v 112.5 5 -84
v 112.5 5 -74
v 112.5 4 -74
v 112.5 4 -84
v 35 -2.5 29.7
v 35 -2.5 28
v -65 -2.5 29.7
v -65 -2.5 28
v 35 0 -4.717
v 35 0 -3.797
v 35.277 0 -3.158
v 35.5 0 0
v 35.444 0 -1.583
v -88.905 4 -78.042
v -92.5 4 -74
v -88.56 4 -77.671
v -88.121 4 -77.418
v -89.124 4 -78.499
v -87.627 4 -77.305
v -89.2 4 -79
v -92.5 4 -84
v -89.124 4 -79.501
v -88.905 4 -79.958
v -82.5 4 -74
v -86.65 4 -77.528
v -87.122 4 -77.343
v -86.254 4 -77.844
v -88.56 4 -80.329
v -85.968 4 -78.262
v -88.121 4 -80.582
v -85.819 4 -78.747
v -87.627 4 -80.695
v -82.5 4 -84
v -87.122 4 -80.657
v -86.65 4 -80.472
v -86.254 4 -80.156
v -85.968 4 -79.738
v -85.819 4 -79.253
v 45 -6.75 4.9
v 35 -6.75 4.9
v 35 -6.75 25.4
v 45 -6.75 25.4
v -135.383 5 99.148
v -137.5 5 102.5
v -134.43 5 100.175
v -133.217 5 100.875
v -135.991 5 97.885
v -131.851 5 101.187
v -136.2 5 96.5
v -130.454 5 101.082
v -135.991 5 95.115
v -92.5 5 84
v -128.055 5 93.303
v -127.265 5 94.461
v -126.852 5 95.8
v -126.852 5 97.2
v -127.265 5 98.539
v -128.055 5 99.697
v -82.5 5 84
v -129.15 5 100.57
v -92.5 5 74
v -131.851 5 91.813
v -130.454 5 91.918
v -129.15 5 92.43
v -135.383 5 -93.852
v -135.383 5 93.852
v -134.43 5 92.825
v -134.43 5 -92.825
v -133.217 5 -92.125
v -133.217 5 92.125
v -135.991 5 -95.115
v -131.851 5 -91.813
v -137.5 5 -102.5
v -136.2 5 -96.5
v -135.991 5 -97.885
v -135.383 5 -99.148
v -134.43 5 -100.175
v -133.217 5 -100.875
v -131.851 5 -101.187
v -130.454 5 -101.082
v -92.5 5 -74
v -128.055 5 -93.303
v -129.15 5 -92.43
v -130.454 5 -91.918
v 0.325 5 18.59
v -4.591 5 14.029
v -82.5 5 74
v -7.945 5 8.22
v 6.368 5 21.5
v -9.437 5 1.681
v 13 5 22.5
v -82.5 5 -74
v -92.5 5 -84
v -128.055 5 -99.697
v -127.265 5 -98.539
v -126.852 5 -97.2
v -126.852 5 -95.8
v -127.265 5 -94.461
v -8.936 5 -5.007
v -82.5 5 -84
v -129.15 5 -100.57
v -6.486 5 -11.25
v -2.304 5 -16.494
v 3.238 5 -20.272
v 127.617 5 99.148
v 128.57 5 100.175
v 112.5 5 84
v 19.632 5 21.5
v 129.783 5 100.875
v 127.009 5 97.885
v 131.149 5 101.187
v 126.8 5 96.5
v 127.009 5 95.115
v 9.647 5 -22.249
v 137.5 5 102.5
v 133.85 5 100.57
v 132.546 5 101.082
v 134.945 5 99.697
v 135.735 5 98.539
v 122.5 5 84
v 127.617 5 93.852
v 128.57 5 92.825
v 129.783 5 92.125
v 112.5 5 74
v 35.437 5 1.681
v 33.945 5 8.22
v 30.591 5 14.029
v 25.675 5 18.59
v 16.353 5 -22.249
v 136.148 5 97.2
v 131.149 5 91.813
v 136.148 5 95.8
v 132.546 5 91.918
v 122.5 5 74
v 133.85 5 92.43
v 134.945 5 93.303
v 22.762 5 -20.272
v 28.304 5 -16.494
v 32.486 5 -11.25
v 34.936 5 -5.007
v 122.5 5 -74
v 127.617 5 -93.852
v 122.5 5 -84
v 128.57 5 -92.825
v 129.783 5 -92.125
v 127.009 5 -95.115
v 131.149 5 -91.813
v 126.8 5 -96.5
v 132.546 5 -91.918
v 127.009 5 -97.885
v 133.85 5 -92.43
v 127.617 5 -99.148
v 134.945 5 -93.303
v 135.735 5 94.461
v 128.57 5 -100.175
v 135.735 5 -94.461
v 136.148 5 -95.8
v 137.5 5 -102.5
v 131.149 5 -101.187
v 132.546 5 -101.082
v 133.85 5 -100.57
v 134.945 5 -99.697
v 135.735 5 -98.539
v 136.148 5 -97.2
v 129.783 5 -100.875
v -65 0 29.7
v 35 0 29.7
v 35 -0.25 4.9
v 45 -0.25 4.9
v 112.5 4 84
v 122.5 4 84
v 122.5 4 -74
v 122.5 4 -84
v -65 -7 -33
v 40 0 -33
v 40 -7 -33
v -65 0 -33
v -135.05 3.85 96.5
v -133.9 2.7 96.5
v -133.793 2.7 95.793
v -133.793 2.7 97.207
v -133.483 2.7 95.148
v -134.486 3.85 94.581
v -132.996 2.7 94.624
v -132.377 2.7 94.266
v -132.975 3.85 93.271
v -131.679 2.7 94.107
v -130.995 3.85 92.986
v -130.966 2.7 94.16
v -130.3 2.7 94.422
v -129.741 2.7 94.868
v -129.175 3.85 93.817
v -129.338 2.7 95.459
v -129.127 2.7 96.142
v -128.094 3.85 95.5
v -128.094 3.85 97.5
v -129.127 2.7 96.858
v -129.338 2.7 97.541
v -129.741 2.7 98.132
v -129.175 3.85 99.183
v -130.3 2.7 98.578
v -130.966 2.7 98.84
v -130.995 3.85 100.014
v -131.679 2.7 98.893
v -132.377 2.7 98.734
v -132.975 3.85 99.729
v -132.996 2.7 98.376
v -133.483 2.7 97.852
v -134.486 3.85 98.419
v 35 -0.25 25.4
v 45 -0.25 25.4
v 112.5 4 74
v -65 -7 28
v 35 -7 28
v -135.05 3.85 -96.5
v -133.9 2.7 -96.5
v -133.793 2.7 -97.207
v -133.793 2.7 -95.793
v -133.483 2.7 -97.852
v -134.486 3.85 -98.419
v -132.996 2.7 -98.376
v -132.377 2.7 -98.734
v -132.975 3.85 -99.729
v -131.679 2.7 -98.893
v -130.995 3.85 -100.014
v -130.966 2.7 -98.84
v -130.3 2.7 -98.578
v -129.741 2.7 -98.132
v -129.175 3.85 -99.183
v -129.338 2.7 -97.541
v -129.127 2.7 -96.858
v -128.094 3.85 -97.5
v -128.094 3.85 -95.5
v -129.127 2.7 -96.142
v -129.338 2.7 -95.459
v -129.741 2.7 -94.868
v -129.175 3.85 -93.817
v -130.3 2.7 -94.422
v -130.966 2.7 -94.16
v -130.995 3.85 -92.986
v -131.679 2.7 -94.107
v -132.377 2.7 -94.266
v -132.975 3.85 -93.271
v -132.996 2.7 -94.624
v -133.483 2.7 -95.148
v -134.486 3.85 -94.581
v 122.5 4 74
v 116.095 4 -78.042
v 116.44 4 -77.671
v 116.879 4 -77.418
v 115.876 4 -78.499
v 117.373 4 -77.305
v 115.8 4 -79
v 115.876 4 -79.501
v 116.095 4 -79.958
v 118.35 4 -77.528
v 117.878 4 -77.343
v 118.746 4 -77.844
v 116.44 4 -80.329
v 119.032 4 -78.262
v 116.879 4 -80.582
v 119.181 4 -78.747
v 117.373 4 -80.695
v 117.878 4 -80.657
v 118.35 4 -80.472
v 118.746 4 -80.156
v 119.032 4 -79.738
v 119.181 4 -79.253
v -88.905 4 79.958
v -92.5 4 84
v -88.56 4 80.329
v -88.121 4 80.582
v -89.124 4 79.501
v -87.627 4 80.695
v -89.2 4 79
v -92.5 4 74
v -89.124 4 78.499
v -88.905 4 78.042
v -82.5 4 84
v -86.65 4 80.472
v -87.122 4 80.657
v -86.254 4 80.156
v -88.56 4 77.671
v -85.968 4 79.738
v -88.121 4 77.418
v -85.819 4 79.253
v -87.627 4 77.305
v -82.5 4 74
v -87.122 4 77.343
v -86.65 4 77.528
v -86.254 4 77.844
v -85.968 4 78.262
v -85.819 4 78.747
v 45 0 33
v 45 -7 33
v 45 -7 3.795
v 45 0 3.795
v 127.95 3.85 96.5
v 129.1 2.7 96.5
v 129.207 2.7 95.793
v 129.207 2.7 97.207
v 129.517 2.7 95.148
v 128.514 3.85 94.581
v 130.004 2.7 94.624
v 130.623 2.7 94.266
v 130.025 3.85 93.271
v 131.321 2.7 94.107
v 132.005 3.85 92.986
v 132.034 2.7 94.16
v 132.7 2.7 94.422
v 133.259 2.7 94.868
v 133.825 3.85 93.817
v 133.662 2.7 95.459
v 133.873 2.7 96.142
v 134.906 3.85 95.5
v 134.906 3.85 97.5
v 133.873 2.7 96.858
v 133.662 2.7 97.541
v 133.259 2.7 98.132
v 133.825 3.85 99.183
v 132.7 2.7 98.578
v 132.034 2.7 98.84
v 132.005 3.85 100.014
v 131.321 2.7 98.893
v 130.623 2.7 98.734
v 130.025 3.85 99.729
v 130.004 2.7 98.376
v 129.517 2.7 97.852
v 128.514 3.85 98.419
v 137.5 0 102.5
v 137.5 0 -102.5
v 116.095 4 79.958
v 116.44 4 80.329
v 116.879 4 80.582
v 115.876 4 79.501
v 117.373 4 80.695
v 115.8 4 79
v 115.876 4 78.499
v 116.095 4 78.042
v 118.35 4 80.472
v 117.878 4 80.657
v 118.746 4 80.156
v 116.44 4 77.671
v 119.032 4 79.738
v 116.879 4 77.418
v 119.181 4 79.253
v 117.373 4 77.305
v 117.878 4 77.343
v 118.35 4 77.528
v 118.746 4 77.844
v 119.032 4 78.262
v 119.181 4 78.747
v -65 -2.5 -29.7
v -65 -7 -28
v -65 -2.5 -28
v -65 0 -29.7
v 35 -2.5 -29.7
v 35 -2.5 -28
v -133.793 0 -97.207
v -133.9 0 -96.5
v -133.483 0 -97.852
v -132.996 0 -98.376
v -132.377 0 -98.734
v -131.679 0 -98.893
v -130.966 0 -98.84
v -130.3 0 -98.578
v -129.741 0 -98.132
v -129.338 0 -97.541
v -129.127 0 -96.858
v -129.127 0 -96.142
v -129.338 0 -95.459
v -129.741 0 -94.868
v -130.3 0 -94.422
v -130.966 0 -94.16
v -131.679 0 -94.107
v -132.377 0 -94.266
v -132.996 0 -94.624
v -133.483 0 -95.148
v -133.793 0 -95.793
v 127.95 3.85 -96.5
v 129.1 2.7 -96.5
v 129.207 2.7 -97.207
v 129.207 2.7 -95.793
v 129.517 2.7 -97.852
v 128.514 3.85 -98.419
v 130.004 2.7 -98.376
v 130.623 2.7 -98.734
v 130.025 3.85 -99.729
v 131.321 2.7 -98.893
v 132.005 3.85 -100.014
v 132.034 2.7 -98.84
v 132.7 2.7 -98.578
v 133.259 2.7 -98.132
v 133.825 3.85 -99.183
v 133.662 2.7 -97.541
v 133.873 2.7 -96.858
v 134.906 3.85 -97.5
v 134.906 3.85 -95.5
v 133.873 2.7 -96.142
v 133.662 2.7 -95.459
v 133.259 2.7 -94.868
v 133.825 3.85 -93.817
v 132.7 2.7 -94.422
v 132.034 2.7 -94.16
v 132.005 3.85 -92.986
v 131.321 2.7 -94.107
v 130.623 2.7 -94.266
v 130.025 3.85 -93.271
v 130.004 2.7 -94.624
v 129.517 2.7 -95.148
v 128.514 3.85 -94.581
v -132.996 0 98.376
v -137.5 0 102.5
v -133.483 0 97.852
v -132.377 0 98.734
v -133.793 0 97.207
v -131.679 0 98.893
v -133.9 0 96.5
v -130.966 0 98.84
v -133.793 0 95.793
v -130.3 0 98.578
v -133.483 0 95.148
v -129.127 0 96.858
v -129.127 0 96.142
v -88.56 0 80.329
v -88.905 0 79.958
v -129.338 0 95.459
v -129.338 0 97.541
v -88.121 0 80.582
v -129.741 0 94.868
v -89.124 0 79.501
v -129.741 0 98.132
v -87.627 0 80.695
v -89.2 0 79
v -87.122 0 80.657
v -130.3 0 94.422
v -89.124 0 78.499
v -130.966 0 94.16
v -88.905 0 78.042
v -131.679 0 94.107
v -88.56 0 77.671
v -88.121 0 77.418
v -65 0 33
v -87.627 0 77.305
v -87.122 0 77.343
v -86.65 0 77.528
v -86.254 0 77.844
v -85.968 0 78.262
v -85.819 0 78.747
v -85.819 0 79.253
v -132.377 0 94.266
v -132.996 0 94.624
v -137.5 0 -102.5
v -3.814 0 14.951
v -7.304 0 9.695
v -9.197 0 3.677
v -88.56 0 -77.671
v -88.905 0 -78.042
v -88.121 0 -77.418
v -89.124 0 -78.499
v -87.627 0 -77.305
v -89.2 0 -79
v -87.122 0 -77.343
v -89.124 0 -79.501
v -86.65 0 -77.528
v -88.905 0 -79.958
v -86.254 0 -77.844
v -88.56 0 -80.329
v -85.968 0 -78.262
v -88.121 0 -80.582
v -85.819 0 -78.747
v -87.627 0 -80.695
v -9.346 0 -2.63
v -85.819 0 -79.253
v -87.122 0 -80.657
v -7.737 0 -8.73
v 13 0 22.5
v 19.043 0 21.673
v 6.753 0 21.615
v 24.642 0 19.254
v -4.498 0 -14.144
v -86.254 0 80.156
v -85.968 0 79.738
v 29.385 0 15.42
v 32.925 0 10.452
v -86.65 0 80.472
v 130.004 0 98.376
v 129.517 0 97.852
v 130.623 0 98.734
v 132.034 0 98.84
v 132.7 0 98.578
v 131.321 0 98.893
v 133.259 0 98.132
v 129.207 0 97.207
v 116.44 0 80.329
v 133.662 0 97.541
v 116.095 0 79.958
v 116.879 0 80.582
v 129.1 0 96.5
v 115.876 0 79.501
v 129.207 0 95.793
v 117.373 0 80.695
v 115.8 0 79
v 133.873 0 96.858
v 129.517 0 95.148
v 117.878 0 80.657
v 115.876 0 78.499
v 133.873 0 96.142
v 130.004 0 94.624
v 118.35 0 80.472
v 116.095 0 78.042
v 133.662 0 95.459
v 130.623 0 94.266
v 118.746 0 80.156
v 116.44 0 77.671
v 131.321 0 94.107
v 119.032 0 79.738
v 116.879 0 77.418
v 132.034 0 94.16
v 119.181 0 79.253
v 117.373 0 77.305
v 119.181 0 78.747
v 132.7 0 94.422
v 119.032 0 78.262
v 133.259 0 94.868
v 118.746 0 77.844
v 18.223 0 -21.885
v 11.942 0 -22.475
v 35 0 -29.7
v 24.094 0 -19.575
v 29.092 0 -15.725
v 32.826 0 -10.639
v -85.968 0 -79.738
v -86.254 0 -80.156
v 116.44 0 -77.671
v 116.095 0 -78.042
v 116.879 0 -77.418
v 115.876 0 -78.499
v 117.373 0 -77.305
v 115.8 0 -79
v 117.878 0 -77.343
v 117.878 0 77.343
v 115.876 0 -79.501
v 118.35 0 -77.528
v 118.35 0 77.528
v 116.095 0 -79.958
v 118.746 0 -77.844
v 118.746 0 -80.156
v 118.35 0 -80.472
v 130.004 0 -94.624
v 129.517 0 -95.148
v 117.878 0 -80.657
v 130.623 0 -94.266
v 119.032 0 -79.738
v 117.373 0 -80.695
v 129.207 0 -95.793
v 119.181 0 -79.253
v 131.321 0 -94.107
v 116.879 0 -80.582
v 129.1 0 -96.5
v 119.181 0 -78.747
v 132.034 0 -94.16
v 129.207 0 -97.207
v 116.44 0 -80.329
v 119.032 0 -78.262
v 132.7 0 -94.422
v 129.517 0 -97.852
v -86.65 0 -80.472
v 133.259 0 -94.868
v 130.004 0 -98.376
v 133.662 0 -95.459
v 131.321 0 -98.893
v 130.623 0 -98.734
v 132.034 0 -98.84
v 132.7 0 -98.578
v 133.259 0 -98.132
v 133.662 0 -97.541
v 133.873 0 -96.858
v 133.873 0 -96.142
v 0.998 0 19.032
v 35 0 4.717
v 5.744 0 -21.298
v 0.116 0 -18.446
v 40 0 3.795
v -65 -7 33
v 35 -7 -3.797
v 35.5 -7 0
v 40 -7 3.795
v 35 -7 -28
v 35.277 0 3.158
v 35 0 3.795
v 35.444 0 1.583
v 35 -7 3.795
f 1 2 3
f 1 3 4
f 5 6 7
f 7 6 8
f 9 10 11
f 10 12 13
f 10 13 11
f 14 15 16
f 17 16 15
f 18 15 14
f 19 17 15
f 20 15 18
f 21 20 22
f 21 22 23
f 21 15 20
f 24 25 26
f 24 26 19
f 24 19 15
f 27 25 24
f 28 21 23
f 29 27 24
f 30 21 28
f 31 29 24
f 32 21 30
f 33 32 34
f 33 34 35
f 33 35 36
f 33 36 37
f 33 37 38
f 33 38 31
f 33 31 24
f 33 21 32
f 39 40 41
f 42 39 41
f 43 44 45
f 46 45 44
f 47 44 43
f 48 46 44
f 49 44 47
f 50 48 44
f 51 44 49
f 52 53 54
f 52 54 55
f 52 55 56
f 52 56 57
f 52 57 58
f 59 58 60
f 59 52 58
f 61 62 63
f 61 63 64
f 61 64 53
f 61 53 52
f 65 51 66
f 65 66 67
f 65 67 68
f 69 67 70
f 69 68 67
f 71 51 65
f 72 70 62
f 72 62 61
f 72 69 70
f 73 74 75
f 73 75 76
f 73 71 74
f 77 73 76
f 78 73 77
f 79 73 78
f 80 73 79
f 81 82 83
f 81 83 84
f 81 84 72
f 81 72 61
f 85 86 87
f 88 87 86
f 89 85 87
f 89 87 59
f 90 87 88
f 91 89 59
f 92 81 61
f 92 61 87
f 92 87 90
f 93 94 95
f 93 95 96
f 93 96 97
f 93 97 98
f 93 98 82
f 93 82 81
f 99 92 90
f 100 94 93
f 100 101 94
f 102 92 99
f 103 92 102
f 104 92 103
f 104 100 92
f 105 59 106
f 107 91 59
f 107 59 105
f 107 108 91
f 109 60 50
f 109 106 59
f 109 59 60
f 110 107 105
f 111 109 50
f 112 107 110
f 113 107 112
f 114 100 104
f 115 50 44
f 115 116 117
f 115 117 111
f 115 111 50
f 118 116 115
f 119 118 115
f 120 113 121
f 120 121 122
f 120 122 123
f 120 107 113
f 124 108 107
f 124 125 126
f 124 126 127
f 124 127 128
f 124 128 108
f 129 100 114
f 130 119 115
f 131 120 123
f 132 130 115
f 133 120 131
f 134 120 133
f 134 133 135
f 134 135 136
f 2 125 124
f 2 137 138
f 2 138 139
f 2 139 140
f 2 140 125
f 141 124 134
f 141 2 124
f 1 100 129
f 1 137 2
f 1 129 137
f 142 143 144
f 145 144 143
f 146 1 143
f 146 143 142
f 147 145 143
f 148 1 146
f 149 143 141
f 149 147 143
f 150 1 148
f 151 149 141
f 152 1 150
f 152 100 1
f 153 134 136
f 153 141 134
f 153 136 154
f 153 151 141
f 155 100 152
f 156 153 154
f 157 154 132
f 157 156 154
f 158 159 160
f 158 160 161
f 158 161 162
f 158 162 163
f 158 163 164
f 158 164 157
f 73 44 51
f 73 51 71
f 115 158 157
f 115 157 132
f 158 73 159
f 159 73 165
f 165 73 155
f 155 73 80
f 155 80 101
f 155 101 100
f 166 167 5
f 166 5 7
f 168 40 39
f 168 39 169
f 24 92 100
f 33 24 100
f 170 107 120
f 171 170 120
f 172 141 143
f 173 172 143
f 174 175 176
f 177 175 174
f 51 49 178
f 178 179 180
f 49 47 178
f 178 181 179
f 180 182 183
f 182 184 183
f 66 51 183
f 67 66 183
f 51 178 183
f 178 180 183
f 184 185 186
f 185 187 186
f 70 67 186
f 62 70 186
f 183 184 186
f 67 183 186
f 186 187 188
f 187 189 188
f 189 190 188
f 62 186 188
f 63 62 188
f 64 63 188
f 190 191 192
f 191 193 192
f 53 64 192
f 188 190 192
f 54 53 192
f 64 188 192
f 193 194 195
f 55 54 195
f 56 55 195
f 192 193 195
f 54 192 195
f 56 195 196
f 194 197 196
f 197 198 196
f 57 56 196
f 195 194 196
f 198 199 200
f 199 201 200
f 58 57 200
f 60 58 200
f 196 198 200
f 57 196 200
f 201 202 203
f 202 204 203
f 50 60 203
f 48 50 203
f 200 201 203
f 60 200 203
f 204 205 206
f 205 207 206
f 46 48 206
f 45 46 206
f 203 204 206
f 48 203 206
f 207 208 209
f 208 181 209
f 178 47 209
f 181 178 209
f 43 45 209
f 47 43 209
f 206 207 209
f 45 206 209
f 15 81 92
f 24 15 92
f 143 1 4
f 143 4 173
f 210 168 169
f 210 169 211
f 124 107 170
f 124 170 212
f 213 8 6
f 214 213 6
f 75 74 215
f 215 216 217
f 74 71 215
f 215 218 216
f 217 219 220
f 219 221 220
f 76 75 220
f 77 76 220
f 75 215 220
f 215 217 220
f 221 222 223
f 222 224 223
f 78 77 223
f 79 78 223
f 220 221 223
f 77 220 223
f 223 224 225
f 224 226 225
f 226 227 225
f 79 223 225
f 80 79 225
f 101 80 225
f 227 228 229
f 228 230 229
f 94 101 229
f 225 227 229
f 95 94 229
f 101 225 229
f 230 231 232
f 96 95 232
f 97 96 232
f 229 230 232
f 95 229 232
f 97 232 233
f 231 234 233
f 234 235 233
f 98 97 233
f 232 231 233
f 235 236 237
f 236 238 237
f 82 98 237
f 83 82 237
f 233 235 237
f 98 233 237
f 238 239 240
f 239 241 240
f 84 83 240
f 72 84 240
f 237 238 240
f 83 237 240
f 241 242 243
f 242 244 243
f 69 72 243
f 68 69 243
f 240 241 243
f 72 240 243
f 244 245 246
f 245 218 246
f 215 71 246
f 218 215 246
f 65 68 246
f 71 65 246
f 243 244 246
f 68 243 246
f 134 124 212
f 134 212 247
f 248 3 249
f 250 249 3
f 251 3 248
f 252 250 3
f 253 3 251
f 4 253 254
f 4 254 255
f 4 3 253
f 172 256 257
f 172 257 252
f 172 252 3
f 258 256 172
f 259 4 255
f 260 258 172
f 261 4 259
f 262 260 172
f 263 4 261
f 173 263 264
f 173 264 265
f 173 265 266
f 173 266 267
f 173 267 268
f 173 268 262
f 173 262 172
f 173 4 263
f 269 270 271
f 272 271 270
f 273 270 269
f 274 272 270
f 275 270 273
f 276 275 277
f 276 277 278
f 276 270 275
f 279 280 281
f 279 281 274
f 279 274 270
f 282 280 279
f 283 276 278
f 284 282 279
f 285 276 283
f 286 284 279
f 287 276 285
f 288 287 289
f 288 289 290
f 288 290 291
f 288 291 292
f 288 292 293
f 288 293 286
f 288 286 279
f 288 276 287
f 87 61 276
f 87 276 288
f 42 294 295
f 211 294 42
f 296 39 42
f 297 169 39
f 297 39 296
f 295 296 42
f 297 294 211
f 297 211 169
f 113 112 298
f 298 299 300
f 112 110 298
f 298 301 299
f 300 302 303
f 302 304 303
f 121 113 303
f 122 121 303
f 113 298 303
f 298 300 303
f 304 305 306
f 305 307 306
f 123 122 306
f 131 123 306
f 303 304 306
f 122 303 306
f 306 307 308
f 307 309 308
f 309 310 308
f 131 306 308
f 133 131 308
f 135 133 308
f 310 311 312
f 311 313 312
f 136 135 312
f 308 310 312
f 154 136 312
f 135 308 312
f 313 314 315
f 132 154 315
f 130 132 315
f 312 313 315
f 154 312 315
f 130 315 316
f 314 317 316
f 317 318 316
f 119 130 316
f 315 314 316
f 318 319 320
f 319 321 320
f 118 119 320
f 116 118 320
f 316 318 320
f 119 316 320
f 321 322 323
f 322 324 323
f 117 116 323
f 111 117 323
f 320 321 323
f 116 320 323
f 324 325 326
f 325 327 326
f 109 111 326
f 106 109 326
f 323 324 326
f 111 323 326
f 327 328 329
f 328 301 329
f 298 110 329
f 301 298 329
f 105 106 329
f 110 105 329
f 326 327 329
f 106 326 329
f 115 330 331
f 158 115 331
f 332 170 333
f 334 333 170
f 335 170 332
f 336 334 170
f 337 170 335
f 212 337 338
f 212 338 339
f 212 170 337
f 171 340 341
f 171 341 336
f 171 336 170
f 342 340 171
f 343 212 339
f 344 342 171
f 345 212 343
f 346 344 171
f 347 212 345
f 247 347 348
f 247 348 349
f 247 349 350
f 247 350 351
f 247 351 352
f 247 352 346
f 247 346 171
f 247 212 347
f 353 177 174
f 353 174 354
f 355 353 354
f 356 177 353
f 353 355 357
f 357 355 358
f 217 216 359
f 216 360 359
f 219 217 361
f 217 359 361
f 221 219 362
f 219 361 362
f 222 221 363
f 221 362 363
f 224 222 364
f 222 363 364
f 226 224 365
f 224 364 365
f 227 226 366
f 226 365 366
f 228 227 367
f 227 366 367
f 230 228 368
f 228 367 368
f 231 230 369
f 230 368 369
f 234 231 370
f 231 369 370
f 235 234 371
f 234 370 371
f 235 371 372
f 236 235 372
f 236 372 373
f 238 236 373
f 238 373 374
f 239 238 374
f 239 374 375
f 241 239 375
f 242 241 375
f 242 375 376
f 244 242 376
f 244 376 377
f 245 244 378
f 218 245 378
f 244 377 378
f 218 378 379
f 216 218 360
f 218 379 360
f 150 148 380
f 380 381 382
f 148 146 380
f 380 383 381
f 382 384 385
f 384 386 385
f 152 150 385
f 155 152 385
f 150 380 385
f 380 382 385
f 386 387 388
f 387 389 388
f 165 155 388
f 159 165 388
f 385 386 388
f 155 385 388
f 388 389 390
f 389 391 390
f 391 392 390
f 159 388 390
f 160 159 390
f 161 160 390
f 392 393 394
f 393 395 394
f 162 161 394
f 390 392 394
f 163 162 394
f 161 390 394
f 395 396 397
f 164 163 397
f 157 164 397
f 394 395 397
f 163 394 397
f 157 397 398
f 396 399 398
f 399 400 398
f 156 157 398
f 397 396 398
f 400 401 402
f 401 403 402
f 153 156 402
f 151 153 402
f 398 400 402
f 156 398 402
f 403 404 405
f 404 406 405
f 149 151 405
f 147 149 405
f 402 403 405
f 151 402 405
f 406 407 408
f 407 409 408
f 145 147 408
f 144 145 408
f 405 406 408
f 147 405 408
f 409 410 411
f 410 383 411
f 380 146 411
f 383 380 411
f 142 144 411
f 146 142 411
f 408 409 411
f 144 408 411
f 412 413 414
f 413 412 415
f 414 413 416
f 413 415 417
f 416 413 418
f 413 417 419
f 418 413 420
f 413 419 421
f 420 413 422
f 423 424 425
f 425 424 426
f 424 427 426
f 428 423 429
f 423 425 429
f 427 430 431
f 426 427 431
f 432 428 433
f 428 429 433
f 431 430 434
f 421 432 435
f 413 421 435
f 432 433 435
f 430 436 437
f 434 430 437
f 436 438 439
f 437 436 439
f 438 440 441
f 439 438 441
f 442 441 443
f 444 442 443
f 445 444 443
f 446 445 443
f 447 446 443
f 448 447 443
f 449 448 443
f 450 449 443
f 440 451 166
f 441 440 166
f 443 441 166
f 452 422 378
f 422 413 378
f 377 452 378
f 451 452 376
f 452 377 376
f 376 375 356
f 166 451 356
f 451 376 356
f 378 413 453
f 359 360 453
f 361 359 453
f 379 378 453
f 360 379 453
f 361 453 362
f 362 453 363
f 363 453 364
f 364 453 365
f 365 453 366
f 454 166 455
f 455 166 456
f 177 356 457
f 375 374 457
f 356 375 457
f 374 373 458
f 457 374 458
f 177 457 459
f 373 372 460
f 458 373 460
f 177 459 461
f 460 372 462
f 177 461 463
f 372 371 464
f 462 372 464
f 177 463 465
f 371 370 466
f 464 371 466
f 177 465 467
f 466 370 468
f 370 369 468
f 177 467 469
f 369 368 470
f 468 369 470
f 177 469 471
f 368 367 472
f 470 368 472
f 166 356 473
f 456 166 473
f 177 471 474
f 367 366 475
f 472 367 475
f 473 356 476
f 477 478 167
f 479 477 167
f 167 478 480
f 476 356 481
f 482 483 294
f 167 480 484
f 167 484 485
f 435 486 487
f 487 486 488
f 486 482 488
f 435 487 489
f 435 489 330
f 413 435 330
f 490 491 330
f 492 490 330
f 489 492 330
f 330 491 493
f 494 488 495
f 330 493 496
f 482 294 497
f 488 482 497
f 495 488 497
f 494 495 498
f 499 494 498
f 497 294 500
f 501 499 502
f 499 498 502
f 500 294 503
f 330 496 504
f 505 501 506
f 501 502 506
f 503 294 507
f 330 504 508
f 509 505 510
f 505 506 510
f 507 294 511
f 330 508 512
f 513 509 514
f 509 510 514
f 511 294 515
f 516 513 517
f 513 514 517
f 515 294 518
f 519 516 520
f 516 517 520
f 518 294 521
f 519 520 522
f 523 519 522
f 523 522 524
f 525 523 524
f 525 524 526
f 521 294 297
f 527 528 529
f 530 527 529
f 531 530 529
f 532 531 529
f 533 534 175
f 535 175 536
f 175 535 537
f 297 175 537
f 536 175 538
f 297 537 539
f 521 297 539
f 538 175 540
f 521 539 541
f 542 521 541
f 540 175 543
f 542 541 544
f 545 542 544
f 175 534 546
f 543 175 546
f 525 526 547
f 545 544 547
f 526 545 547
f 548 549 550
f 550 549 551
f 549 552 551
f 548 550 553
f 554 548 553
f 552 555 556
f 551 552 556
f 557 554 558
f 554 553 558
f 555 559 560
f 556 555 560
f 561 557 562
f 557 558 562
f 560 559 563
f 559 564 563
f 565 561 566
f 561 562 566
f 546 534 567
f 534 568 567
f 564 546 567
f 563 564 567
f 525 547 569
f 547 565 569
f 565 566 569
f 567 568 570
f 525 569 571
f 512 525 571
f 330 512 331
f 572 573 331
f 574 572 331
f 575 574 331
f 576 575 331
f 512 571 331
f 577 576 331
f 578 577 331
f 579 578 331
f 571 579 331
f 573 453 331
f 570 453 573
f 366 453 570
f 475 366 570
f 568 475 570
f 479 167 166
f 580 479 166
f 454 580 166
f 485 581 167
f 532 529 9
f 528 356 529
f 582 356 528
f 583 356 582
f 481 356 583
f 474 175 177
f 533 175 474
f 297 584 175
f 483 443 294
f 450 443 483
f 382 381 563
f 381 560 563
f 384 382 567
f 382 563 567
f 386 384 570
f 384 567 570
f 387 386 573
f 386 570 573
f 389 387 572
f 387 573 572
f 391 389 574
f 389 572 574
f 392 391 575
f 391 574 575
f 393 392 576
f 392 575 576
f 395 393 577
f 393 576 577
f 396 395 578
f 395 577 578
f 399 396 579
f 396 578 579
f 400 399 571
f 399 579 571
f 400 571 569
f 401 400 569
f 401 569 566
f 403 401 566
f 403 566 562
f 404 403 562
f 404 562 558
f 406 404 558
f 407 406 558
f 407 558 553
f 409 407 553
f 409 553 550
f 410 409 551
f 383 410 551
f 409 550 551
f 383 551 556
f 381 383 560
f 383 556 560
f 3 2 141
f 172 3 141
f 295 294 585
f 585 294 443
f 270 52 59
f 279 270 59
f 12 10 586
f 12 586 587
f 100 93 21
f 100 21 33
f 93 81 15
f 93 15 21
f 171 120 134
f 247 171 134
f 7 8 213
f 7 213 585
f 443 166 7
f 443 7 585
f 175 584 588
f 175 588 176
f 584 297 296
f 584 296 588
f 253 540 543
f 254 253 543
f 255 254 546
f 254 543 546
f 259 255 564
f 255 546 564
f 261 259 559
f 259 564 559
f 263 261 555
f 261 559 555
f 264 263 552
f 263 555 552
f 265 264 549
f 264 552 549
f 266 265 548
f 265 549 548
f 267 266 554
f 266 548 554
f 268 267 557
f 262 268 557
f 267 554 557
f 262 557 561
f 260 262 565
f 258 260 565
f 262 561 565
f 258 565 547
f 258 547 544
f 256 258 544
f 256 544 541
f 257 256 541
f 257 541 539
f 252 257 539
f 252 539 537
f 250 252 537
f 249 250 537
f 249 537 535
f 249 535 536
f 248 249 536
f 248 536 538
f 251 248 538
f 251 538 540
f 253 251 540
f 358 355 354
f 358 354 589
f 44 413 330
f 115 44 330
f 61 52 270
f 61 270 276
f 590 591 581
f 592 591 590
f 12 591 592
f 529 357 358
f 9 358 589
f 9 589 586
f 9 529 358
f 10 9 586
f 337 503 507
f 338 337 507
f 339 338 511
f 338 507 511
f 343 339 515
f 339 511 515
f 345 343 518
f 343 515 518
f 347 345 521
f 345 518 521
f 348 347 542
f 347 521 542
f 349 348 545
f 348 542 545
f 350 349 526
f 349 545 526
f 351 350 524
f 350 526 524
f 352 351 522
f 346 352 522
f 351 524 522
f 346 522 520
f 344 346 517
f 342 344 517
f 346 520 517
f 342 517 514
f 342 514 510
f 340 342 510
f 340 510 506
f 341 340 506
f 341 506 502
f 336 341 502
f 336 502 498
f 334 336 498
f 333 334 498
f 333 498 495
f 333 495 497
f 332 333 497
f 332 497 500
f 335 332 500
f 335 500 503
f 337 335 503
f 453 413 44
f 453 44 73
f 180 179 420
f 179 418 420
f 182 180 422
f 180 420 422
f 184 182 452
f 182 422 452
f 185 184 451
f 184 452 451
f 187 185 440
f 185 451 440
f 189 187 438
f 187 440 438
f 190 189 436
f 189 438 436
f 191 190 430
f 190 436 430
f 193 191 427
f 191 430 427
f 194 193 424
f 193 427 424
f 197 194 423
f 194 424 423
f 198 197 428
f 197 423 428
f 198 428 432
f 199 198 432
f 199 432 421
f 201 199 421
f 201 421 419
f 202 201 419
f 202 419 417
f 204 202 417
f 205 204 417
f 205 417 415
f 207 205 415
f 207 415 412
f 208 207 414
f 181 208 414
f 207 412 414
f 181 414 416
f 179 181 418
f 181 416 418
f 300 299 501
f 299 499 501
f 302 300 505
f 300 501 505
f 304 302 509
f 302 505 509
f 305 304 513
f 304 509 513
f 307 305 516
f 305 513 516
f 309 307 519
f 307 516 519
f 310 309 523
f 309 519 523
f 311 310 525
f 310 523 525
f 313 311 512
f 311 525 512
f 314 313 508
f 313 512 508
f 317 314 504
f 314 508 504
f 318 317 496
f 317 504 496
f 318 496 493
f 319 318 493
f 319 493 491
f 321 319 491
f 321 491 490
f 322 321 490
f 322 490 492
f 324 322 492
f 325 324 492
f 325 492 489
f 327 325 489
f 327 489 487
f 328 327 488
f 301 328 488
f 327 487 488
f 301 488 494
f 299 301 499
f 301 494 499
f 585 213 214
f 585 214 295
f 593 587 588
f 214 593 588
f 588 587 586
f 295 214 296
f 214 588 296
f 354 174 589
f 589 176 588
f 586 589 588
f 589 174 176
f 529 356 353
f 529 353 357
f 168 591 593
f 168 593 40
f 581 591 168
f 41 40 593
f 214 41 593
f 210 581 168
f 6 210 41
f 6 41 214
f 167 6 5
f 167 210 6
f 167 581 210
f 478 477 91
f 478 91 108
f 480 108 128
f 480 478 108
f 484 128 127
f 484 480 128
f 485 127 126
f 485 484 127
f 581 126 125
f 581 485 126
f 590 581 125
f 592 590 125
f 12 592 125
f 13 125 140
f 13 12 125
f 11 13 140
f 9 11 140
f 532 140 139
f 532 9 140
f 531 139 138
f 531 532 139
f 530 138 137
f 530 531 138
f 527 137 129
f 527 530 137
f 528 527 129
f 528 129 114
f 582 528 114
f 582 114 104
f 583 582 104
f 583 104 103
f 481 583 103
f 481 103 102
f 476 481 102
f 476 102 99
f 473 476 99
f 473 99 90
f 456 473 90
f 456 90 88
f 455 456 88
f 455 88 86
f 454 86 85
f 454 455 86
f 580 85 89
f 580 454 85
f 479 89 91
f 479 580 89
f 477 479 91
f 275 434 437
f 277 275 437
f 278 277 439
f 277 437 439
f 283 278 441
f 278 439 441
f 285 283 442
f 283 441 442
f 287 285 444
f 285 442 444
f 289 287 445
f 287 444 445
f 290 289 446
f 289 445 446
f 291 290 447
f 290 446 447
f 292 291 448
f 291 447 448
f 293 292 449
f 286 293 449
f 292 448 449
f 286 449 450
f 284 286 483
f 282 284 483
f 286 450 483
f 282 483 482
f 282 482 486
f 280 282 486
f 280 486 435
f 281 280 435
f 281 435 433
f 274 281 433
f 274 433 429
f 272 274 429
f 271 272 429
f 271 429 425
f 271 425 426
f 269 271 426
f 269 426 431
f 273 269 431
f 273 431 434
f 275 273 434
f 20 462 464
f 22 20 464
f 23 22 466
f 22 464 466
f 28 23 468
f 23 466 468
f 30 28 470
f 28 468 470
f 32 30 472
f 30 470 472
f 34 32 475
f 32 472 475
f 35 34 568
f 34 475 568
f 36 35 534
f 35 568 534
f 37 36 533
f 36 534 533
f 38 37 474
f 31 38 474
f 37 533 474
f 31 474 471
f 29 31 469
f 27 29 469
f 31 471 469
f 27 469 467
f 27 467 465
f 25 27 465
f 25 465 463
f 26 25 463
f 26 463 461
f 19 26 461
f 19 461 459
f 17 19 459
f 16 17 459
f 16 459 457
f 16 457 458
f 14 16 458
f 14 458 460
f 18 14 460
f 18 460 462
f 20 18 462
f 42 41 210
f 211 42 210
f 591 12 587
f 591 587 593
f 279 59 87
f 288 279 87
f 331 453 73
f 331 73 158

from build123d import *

# Parameters (mm, degrees)
ESQUISSE1_W                                    = 275
ESQUISSE1_H                                    = 205
BOSS_EXTRU_1_DEPTH                             = 5
FRAISAGE_POUR_VIS_T_TE_FRAIS_E_M41_D           = 4.8
FRAISAGE_POUR_VIS_T_TE_FRAIS_E_M41_CSINK_D     = 9.4
FRAISAGE_POUR_VIS_T_TE_FRAIS_E_M41_CSINK_ANGLE = 90
ESQUISSE5_W                                    = 10
ESQUISSE5_H                                    = 10
ENL_V_MAT_EXTRU_1_DEPTH                        = 1
ENL_V_MAT_EXTRU_2_DEPTH                        = 172.573599368
ENL_V_MAT_EXTRU_2_DEPTH_BACK                   = 172.573599368
ESQUISSE9_R                                    = 22.5
D_GAGEMENT_M32_D                               = 3.4
D_GAGEMENT_M32_DEPTH                           = 12
D_GAGEMENT_M32_TIP                             = 1.021463052
ESQUISSE16_W                                   = 100
ESQUISSE16_H                                   = 5
BOSS_EXTRU_2_DEPTH                             = 7
ESQUISSE18_W                                   = 100
ESQUISSE18_H                                   = 2.5
ENL_V_MAT_EXTRU_3_DEPTH                        = 1.7
ESQUISSE17_W                                   = 100
ESQUISSE17_H                                   = 2.5
ENL_V_MAT_EXTRU_4_DEPTH                        = 1.7
BOSS_EXTRU_4_DEPTH                             = 7
ESQUISSE21_W                                   = 20.5
ESQUISSE21_H                                   = 6.5
ENL_V_MAT_EXTRU_5_DEPTH                        = 13


with BuildPart() as part:
    # Esquisse1 → Boss.-Extru.1 (new body)
    with BuildSketch(Plane(origin=(0, 0, 0), x_dir=(1, 0, 0), z_dir=(0, 1, 0))):
        Rectangle(ESQUISSE1_W, ESQUISSE1_H)
    extrude(amount=BOSS_EXTRU_1_DEPTH)

    # Fraisage pour vis à tête fraisée M41 (through all)
    with Locations(Plane(origin=(0, 5, 0), x_dir=(1, 0, 0), z_dir=(0, 1, 0))):
        with Locations((-131.5, 96.5), (-131.5, -96.5), (131.5, -96.5), (131.5, 96.5)):
            CounterSinkHole(FRAISAGE_POUR_VIS_T_TE_FRAIS_E_M41_D / 2, FRAISAGE_POUR_VIS_T_TE_FRAIS_E_M41_CSINK_D / 2, counter_sink_angle=FRAISAGE_POUR_VIS_T_TE_FRAIS_E_M41_CSINK_ANGLE)

    # Esquisse5 → Enlèv. mat.-Extru.1 (cut)
    with BuildSketch(Plane(origin=(0, 5, 0), x_dir=(1, 0, 0), z_dir=(0, 1, 0))):
        with Locations((-87.5, 79)):
            Rectangle(ESQUISSE5_W, ESQUISSE5_H)
        with Locations((117.5, 79)):
            Rectangle(ESQUISSE5_W, ESQUISSE5_H)
        with Locations((117.5, -79)):
            Rectangle(ESQUISSE5_W, ESQUISSE5_H)
        with Locations((-87.5, -79)):
            Rectangle(ESQUISSE5_W, ESQUISSE5_H)
    extrude(amount=-ENL_V_MAT_EXTRU_1_DEPTH, mode=Mode.SUBTRACT)

    # Esquisse9 → Enlèv. mat.-Extru.2 (cut, two sides: drawn at the far end of the back side and taken through both)
    with BuildSketch(Plane(origin=(0, 5, 0), x_dir=(1, 0, 0), z_dir=(0, 1, 0)).offset(-ENL_V_MAT_EXTRU_2_DEPTH_BACK)):
        with Locations(Location((13, 0, 0), (0, 0, 270))):
            Circle(ESQUISSE9_R)
    extrude(amount=ENL_V_MAT_EXTRU_2_DEPTH + ENL_V_MAT_EXTRU_2_DEPTH_BACK, mode=Mode.SUBTRACT)

    # Dégagement M32
    with Locations(Plane(origin=(0, 4, 0), x_dir=(1, 0, 0), z_dir=(0, 1, 0))):
        with Locations((-87.5, -79), (-87.5, 79), (117.5, 79), (117.5, -79)):
            Hole(D_GAGEMENT_M32_D / 2, depth=D_GAGEMENT_M32_DEPTH)
            with Locations((0, 0, -(D_GAGEMENT_M32_DEPTH + D_GAGEMENT_M32_TIP / 2))):  # 118° drill point
                Cone(0, D_GAGEMENT_M32_D / 2, D_GAGEMENT_M32_TIP, mode=Mode.SUBTRACT)

    # Esquisse16 → Boss.-Extru.2 (add)
    with BuildSketch(Plane.XZ):
        with Locations((-15, 30.5)):
            Rectangle(ESQUISSE16_W, ESQUISSE16_H)
        with Locations((-15, -30.5)):
            Rectangle(ESQUISSE16_W, ESQUISSE16_H)
    extrude(amount=BOSS_EXTRU_2_DEPTH)

    # Esquisse18 → Enlèv. mat.-Extru.3 (cut)
    with BuildSketch(Plane(origin=(0, 0, 28), x_dir=(-1, 0, 0), z_dir=(0, 0, -1))):
        with Locations((15, -1.25)):
            Rectangle(ESQUISSE18_W, ESQUISSE18_H)
    extrude(amount=-ENL_V_MAT_EXTRU_3_DEPTH, mode=Mode.SUBTRACT)

    # Esquisse17 → Enlèv. mat.-Extru.4 (cut)
    with BuildSketch(Plane.XY.offset(-28)):
        with Locations((-15, -1.25)):
            Rectangle(ESQUISSE17_W, ESQUISSE17_H)
    extrude(amount=-ENL_V_MAT_EXTRU_4_DEPTH, mode=Mode.SUBTRACT)

    # Esquisse19 → Boss.-Extru.4 (add)
    with BuildSketch(Plane(origin=(0, 0, 0), x_dir=(-1, 0, 0), z_dir=(0, -1, 0))):
        Polygon((-35, -33), (-40, -33), (-45, -33), (-45, -3.794590368), (-40, -3.794590368), (-40, 33), (-35, 33), (-35, 3.79695048), (-35.5, 0), (-35, -3.794590368), align=None)
    extrude(amount=BOSS_EXTRU_4_DEPTH)

    # Esquisse21 → Enlèv. mat.-Extru.5 (cut)
    with BuildSketch(Plane.ZY.offset(-35)):
        with Locations((15.149590368, -3.5)):
            Rectangle(ESQUISSE21_W, ESQUISSE21_H)
    extrude(amount=-ENL_V_MAT_EXTRU_5_DEPTH, mode=Mode.SUBTRACT)


solid = part.part
